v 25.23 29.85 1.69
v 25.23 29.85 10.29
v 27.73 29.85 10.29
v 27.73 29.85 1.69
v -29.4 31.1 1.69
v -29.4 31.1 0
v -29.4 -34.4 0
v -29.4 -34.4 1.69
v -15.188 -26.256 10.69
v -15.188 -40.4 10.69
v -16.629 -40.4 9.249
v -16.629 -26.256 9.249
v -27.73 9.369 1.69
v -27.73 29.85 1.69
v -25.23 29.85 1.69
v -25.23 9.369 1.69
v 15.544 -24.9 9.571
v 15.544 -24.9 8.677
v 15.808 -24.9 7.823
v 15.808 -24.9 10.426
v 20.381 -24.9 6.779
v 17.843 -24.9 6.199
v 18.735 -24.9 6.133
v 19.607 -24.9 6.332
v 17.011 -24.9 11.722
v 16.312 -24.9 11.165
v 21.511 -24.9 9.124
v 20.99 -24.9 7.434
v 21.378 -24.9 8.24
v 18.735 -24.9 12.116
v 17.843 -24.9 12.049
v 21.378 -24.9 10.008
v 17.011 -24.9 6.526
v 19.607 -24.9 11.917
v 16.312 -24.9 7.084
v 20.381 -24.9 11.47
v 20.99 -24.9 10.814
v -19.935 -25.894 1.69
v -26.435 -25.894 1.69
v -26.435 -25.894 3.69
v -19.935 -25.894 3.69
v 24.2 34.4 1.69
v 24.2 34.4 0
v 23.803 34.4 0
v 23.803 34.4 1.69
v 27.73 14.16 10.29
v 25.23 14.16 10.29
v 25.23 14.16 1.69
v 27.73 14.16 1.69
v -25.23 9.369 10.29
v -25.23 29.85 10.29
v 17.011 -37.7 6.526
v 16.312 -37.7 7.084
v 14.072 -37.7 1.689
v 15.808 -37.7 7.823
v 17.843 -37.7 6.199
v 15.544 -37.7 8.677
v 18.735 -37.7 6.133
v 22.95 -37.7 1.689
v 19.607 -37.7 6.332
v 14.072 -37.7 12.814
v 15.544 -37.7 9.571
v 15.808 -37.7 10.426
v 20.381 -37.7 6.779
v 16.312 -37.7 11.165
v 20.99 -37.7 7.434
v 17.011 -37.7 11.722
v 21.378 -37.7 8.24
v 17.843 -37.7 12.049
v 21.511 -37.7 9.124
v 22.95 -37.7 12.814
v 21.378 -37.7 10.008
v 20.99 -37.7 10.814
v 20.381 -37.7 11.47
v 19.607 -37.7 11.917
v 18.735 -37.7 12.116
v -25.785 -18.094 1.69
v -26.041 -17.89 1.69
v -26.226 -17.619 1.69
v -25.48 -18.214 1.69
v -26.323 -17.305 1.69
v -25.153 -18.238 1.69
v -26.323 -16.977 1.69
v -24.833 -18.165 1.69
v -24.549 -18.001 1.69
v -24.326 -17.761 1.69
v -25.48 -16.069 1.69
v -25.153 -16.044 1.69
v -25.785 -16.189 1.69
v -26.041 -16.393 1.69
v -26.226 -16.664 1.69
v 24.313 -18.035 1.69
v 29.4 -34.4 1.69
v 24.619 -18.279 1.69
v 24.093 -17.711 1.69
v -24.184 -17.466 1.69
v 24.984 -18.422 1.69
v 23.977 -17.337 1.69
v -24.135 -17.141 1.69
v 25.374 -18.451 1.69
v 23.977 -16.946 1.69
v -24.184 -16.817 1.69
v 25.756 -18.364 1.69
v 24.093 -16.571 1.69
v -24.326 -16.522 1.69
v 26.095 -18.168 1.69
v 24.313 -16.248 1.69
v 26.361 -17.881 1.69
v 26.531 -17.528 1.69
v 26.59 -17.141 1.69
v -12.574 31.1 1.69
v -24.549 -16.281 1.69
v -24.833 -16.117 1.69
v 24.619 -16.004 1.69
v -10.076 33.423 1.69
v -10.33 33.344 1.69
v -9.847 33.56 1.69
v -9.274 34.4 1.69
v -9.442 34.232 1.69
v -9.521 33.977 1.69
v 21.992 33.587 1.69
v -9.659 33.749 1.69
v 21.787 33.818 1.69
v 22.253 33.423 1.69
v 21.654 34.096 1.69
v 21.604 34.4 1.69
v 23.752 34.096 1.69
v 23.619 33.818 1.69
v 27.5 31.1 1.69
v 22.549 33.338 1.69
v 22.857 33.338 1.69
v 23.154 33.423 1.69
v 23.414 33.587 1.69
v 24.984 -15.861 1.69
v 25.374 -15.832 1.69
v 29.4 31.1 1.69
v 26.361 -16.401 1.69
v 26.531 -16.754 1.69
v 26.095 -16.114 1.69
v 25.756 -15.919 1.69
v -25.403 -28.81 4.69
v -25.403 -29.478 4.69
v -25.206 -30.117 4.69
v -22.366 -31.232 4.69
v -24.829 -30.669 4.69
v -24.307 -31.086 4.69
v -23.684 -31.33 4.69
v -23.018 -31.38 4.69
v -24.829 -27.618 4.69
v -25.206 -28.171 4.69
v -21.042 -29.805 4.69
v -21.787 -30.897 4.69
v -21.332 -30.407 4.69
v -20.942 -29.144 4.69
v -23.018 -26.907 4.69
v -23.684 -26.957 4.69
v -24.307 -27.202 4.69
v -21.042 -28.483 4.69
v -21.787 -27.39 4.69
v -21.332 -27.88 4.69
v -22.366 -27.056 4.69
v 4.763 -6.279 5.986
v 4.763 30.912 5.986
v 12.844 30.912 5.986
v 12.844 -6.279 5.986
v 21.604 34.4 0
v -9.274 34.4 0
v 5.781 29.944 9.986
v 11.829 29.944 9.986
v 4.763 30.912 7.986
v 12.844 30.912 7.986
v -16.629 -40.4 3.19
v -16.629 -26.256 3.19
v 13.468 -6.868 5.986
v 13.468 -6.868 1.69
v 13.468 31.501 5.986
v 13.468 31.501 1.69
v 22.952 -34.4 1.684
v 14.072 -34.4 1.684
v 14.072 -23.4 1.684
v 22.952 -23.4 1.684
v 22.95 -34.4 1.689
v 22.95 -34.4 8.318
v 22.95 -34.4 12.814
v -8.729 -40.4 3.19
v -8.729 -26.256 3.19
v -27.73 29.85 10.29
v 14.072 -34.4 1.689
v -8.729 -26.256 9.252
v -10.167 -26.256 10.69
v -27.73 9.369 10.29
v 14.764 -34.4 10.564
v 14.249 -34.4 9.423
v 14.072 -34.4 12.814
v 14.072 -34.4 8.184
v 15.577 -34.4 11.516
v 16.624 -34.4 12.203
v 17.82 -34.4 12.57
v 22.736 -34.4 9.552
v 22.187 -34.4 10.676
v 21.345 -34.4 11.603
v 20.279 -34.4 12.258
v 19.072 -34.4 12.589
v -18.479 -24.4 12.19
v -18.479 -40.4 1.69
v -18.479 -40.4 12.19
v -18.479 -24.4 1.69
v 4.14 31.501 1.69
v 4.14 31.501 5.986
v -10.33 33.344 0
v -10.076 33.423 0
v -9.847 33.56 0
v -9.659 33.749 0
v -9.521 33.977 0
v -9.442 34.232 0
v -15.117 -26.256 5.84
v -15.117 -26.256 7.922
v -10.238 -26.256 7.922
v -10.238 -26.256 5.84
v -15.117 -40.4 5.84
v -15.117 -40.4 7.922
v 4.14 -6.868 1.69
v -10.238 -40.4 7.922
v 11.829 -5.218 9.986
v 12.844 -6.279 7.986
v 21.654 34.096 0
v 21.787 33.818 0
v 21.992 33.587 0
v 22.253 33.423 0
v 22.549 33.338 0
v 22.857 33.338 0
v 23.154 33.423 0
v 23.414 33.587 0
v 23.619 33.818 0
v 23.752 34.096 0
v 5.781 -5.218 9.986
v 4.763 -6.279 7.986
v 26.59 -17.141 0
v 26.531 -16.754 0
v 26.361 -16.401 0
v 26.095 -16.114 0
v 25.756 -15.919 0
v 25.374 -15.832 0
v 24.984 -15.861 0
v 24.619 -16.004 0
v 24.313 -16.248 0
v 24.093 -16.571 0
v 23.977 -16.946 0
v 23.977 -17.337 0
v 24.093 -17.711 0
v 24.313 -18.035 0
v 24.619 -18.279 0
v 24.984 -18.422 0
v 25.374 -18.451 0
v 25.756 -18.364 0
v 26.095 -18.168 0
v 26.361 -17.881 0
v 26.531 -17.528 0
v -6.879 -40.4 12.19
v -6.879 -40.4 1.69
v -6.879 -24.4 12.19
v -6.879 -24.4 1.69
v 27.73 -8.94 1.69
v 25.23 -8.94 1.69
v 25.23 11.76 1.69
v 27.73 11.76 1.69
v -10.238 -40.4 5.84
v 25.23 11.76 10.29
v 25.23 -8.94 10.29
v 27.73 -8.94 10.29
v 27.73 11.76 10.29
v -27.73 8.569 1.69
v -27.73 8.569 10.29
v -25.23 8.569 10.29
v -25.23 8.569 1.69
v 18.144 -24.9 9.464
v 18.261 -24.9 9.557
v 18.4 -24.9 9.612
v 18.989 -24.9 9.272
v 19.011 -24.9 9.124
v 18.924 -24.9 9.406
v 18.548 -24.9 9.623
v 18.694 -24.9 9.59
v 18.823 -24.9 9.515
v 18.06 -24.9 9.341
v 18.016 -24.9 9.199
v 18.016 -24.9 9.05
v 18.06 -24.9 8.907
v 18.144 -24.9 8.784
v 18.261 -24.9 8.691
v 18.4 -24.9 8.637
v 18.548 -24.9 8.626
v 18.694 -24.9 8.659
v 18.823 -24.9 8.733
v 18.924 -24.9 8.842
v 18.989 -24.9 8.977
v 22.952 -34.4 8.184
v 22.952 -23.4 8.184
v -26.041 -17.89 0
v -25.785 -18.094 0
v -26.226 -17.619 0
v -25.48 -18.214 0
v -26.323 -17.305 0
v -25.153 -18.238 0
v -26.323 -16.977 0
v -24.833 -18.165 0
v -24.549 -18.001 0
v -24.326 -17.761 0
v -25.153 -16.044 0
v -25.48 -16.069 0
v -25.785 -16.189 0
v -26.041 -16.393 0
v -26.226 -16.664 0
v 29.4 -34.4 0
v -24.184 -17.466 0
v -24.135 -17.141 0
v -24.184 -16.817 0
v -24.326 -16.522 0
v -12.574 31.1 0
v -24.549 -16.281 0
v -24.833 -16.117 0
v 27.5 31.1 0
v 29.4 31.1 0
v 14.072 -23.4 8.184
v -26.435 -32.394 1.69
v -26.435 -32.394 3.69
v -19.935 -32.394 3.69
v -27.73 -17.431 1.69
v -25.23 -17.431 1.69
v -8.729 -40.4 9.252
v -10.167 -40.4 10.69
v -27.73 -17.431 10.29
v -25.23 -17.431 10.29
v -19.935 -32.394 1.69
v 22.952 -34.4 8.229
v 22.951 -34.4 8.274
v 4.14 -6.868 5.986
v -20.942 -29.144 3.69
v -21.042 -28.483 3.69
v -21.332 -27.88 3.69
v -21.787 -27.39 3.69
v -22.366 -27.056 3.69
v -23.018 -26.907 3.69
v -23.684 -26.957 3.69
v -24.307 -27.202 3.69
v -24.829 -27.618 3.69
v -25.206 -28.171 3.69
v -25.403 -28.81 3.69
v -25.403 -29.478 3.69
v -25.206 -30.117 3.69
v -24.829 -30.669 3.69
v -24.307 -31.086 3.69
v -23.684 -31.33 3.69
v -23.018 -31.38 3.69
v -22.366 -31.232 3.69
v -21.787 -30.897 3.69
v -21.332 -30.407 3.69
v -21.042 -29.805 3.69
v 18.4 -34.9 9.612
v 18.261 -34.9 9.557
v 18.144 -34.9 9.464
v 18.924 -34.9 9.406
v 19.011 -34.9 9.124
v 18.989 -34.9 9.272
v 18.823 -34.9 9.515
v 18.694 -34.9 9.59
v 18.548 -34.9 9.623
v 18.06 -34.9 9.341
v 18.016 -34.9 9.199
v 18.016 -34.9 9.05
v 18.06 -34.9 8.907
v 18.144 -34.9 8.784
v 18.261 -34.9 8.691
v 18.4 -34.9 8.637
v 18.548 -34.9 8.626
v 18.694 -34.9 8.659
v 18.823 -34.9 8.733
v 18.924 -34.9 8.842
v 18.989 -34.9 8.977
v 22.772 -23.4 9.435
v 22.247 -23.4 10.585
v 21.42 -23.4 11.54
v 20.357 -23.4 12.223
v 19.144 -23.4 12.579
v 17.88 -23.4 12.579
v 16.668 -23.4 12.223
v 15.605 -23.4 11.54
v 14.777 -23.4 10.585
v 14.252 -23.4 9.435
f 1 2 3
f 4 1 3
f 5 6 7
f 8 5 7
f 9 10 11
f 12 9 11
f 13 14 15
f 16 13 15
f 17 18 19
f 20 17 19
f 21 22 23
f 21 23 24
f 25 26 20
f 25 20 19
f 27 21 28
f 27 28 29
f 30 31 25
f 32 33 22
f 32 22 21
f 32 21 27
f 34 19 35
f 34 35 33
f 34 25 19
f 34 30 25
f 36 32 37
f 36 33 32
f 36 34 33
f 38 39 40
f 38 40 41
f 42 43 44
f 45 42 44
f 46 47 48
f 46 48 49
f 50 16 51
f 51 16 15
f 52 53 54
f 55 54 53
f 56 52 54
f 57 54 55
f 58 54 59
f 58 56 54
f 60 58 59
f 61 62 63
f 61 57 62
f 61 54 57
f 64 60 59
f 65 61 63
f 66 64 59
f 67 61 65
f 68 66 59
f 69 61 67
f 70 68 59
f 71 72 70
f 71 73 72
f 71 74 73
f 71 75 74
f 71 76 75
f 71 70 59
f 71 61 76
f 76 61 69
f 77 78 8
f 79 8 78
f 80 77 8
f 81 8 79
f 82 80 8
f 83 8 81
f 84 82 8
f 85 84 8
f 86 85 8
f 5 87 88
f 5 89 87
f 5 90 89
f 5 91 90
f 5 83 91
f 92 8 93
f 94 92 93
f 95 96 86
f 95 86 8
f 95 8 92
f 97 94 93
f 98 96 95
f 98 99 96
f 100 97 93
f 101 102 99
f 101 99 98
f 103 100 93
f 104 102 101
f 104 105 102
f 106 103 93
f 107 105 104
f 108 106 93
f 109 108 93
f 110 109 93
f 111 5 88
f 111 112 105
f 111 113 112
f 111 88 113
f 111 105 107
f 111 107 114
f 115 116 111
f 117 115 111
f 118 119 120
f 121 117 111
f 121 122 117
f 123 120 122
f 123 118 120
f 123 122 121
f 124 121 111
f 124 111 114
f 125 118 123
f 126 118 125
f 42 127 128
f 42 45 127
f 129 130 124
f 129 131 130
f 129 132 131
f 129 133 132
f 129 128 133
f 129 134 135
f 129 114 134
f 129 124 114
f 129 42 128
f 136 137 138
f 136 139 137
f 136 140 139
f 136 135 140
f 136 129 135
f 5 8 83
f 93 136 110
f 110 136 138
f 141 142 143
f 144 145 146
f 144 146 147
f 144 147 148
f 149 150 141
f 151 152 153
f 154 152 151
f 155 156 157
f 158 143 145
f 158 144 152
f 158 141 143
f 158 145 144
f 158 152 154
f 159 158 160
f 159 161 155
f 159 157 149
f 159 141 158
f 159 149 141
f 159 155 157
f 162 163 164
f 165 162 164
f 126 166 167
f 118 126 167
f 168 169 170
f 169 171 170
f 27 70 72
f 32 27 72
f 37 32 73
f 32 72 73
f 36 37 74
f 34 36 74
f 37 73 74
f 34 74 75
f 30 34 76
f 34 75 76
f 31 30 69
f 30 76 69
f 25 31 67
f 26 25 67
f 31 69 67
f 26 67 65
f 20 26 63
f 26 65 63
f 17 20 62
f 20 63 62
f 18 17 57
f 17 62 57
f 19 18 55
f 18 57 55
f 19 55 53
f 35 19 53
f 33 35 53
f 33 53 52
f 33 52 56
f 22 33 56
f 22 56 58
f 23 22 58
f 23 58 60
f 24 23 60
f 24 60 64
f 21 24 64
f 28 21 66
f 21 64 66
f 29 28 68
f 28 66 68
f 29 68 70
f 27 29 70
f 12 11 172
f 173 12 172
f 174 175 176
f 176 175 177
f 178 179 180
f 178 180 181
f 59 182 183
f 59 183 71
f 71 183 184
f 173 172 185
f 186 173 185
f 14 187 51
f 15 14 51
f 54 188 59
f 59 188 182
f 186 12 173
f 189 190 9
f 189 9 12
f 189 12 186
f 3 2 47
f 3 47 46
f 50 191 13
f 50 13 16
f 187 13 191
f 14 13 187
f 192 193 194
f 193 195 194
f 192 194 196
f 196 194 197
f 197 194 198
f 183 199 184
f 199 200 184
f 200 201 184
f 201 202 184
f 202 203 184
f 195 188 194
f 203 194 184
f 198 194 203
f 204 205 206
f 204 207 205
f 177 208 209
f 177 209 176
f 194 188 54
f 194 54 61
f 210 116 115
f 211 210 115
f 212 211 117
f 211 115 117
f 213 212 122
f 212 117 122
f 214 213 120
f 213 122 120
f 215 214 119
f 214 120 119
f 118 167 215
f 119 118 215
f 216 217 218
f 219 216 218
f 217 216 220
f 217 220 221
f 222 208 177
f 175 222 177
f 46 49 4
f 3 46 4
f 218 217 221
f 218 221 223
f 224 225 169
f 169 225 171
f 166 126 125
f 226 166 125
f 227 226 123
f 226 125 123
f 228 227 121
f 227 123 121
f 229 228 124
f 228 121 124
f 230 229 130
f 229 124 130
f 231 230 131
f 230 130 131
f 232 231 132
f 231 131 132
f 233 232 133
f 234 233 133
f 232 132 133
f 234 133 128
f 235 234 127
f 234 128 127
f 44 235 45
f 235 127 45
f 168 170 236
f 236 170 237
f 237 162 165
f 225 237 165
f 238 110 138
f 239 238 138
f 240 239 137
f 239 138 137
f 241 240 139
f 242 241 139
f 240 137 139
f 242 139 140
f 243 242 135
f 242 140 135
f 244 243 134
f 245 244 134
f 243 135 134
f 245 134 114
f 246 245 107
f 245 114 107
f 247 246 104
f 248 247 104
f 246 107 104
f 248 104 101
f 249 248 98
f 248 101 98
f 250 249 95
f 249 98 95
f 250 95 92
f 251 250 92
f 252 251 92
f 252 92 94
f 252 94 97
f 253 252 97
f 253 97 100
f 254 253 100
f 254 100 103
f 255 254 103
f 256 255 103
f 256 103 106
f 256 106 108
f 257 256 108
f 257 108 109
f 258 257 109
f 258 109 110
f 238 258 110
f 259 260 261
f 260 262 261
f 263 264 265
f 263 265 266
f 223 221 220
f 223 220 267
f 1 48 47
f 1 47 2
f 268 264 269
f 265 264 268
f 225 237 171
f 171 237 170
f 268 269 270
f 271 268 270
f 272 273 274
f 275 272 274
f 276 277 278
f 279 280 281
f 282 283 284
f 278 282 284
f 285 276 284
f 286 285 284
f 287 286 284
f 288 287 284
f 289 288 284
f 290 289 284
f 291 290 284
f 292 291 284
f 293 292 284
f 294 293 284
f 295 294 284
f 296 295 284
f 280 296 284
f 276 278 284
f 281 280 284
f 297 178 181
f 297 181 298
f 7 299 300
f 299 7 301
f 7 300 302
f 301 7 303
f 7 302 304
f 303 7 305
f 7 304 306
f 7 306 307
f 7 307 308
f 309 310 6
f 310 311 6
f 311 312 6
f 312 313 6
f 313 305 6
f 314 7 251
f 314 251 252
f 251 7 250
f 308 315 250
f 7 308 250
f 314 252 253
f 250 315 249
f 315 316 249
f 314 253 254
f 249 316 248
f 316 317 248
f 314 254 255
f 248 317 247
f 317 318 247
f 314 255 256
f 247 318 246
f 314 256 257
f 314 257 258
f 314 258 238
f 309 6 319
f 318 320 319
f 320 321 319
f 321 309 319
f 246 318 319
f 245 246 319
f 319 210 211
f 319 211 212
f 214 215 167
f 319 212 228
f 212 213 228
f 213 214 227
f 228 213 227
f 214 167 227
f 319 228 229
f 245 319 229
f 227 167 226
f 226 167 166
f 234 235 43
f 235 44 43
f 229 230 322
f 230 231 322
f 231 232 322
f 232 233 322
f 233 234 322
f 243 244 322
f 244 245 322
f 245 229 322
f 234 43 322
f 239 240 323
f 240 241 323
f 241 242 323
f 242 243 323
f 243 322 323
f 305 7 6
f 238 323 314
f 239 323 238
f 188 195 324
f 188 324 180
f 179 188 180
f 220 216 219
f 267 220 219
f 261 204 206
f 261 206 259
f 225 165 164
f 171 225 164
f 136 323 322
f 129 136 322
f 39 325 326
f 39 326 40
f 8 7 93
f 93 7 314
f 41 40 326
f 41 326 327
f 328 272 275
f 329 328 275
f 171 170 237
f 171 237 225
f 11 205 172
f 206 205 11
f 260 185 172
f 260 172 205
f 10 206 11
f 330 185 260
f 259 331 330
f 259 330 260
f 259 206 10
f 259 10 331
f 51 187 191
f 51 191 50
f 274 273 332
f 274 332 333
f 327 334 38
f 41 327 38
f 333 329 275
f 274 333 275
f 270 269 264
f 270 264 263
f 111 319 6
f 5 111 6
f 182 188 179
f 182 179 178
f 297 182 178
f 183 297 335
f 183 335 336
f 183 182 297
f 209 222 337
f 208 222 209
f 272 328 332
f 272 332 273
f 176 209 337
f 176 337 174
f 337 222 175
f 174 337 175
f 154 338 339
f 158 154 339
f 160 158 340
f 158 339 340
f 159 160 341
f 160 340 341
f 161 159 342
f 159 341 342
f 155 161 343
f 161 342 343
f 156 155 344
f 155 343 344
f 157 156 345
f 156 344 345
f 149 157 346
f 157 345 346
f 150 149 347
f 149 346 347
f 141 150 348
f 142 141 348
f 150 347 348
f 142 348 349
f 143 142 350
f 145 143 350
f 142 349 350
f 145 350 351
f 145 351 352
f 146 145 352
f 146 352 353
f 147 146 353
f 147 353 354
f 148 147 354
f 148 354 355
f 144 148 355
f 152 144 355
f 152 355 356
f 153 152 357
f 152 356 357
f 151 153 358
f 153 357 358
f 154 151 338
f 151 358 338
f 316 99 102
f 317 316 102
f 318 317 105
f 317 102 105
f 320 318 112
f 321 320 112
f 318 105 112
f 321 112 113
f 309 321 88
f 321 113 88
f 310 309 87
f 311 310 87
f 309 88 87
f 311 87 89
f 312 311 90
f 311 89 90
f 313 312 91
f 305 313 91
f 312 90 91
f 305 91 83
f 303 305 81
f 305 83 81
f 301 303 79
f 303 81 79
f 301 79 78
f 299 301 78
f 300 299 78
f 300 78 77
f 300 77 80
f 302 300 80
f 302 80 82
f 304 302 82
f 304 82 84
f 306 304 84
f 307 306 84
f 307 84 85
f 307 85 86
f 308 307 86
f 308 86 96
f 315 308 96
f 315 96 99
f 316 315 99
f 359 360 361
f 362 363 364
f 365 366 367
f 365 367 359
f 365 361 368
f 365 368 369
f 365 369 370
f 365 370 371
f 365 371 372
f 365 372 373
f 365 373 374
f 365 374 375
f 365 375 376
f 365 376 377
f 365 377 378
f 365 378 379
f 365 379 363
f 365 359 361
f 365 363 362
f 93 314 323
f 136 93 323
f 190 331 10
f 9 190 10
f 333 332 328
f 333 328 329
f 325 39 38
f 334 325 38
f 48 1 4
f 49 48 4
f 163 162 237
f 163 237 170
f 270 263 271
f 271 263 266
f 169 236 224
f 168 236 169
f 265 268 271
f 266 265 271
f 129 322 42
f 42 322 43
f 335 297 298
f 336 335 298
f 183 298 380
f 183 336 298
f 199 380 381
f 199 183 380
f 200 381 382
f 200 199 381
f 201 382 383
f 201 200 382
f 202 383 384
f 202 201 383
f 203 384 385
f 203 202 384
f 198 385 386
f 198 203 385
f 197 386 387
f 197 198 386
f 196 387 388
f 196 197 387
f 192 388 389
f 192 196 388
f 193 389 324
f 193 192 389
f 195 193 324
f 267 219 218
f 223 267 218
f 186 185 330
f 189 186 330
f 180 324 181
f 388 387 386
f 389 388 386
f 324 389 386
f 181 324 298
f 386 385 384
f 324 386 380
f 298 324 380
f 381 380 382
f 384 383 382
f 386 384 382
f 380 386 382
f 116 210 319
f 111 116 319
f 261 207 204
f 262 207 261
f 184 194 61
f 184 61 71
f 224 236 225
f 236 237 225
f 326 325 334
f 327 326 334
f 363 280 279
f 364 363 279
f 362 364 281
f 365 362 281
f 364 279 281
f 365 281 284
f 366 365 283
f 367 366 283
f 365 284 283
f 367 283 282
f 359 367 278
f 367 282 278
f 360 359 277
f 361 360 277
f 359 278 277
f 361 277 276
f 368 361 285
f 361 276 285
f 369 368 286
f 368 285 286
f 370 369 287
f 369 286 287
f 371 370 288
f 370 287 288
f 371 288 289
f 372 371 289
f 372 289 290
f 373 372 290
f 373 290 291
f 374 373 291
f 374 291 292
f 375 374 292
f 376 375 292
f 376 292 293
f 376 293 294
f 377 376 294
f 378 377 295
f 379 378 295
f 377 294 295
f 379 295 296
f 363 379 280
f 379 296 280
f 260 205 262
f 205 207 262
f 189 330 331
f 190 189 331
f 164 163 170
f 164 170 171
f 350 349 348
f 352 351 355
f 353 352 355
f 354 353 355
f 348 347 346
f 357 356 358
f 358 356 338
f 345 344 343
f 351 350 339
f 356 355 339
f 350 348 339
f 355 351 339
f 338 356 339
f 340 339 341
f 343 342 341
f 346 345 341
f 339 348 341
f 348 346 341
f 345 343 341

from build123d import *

# Parameters (mm, degrees)
F1_DEPTH   = 1.69
F2_W       = 2.5
F2_H       = 20.7
F3_DEPTH   = 8.6
F2_H_2     = 15.69
F2_H_3     = 20.481327492
F2_H_4     = 26
F6_DEPTH   = 11
F7_W       = 8.87868274
F7_H       = 11.1249446636
F8_DEPTH   = 3.3
F9_R       = 3
F10_DEPTH  = 12.8
F11_R      = 0.5
F12_DEPTH  = 10
F13_W      = 11.6
F13_H      = 10
F14_DEPTH  = 10.5
F15_W      = 11.6
F15_H      = 10.5
F16_DEPTH  = 6
F18_DEPTH  = 14.14393
F19_W      = 4.8785965383
F19_H      = 2.0820805803
F20_DEPTH  = 14.14393
F21_W      = 6.5
F21_H      = 6.5
F22_DEPTH  = 2
F23_R      = 2.2427667378
F24_DEPTH  = 1
F25_W      = 9.3276520822
F25_H      = 38.3693373368
F26_DEPTH  = 4.29568
F27_W      = 8.0811752376
F27_H      = 37.1907090231
F28_DEPTH  = 2
F30_W      = 6.0478351079
F30_H      = 35.1617564447
F28_FACE_W = 8.0811752376
F28_FACE_H = 37.1907090231
F33_DEPTH  = 1.691
F34_R      = 1.1
F34_R_2    = 1.3134018391
F35_DEPTH  = 1.691


# Not quite as in the source:
# - a feature of the source that left no trace in its solid (it failed there, or was rolled back) is left out


with BuildPart() as f1:
    # F0 (on Top) → F1 (new body)
    with BuildSketch(Plane.XY):
        Polygon((24.2, 34.4), (-9.2744298918, 34.4), (-12.5744298918, 31.1), (-29.4, 31.1), (-29.4, -34.4), (29.4, -34.4), (29.4, 31.1), (27.5, 31.1), align=None)
    extrude(amount=F1_DEPTH)

    # F32 (on face) → F33 (cut, through all)
    with BuildSketch(Plane.XY.offset(1.69)):
        with BuildLine():
            Line((-9.4422222306, 34.2322076612), (-10.3304163494, 33.3440135424))
            ThreePointArc((-10.3304163494, 33.3440135424), (-9.7470766516, 33.6488679634), (-9.4422222306, 34.2322076612))
        make_face()
        with BuildLine():
            ThreePointArc((-9.4422222306, 34.2322076612), (-9.4292347048, 34.3290613178), (-9.4248941109, 34.4266854227))
            ThreePointArc((-9.4248941109, 34.4266854227), (-11.3686729734, 35.132402952), (-10.3304163494, 33.3440135424))
            Line((-10.3304163494, 33.3440135424), (-9.4422222306, 34.2322076612))
        make_face()
        with BuildLine():
            Line((23.8030258555, 34.4), (21.6036733251, 34.4))
            ThreePointArc((21.6036733251, 34.4), (22.7033495903, 33.3266854227), (23.8030258555, 34.4))
        make_face()
        with BuildLine():
            ThreePointArc((23.8033495903, 34.4266854227), (22.6900058972, 35.526604486), (21.6036733251, 34.4))
            Line((21.6036733251, 34.4), (23.8030258555, 34.4))
            ThreePointArc((23.8030258555, 34.4), (23.8032686536, 34.4133417295), (23.8033495903, 34.4266854227))
        make_face()
    extrude(amount=-F33_DEPTH, mode=Mode.SUBTRACT)

    # F34 (on face) → F35 (cut, through all)
    with BuildSketch(Plane.XY.offset(1.69)):
        with Locations((-25.2349545183, -17.141347751)):
            Circle(F34_R)
        with Locations((25.2761915326, -17.141347751)):
            Circle(F34_R_2)
    extrude(amount=-F35_DEPTH, mode=Mode.SUBTRACT)


with BuildPart() as f3:
    # F2 (on face) → F3 (new body)
    with BuildSketch(Plane.XY.offset(1.69)):
        with Locations((26.48, 1.41)):
            Rectangle(F2_W, F2_H)
    extrude(amount=F3_DEPTH)


with BuildPart() as f3b:
    # F2 (on face) → F3, piece 2 (new body)
    with BuildSketch(Plane.XY.offset(1.69)):
        with Locations((26.48, 22.005)):
            Rectangle(F2_W, F2_H_2)
    extrude(amount=F3_DEPTH)


with BuildPart() as f3c:
    # F2 (on face) → F3, piece 3 (new body)
    with BuildSketch(Plane.XY.offset(1.69)):
        with Locations((-26.48, 19.609336254)):
            Rectangle(F2_W, F2_H_3)
    extrude(amount=F3_DEPTH)


with BuildPart() as f3d:
    # F2 (on face) → F3, piece 4 (new body)
    with BuildSketch(Plane.XY.offset(1.69)):
        with Locations((-26.48, -4.431327492)):
            Rectangle(F2_W, F2_H_4)
    extrude(amount=F3_DEPTH)


with BuildPart() as f6:
    # F5 (on offset) → F6 (new body)
    with BuildSketch(Plane.XZ.offset(34.4)):
        with BuildLine():
            Line((14.0722493033, 1.6842637178), (22.9522493033, 1.6842637178))
            Line((22.9522493033, 1.6842637178), (22.9522493033, 8.1842637178))
            ThreePointArc((22.9522493033, 8.1842637178), (18.5122493033, 12.6242637178), (14.0722493033, 8.1842637178))
            Line((14.0722493033, 8.1842637178), (14.0722493033, 1.6842637178))
        make_face()
    extrude(amount=-F6_DEPTH)

    # F7 (on offset) → F8 (join)
    with BuildSketch(Plane.XZ.offset(34.4)):
        with Locations((18.5108794831, 7.2514217463)):
            Rectangle(F7_W, F7_H)
    extrude(amount=F8_DEPTH)

    # F9 (on face) → F10 (cut)
    with BuildSketch(Plane.XZ.offset(37.7)):
        with Locations((18.5108794831, 9.124157019)):
            Circle(F9_R)
    extrude(amount=-F10_DEPTH, mode=Mode.SUBTRACT)


with BuildPart() as f12:
    # F11 (on face) → F12 (new body)
    with BuildSketch(Plane.XZ.offset(24.9)):
        with Locations((18.5108794831, 9.124157019)):
            Circle(F11_R)
    extrude(amount=F12_DEPTH)


with BuildPart() as f14:
    # F13 (on face) → F14 (new body)
    with BuildSketch(Plane.XY.offset(1.69)):
        with Locations((-12.6785661542, -29.4)):
            Rectangle(F13_W, F13_H)
    extrude(amount=F14_DEPTH)

    # F15 (on face) → F16 (join)
    with BuildSketch(Plane.XZ.offset(34.4)):
        with Locations((-12.6785661542, 6.94)):
            Rectangle(F15_W, F15_H)
    extrude(amount=F16_DEPTH)

    # F17 (on face) → F18 (cut)
    with BuildSketch(Plane.XZ.offset(40.4)):
        Polygon((-16.6285661542, 9.2491237447), (-16.6285661542, 3.19), (-8.7285661542, 3.19), (-8.7285661542, 9.2515923473), (-10.1669738069, 10.69), (-15.1876898989, 10.69), align=None)
    extrude(amount=-F18_DEPTH, mode=Mode.SUBTRACT)


with BuildPart() as f20:
    # F19 (on face) → F20 (new body, through all)
    with BuildSketch(Plane.XZ.offset(26.25607)):
        with Locations((-12.6773318529, 6.8805450574)):
            Rectangle(F19_W, F19_H)
    extrude(amount=F20_DEPTH)


with BuildPart() as f22:
    # F21 (on face) → F22 (new body)
    with BuildSketch(Plane.XY.offset(1.69)):
        with Locations((-23.1851451099, -29.143884778)):
            Rectangle(F21_W, F21_H)
    extrude(amount=F22_DEPTH)


with BuildPart() as f24:
    # F23 (on face) → F24 (new body)
    with BuildSketch(Plane.XY.offset(3.69)):
        with Locations((-23.1851451099, -29.143884778)):
            Circle(F23_R)
    extrude(amount=F24_DEPTH)


with BuildPart() as f26:
    # F25 (on face) → F26 (new body)
    with BuildSketch(Plane.XY.offset(1.69)):
        with Locations((8.8037233053, 12.316826851)):
            Rectangle(F25_W, F25_H)
    extrude(amount=F26_DEPTH)


with BuildPart() as f28:
    # F27 (on face) → F28 (new body)
    with BuildSketch(Plane.XY.offset(5.98568)):
        with Locations((8.8037233053, 12.316826851)):
            Rectangle(F27_W, F27_H)
    extrude(amount=F28_DEPTH)


with BuildPart() as f31:
    # F30 (on offset) → F31 section 0
    with BuildSketch(Plane.XY.offset(9.98568)):
        with Locations((8.8047666941, 12.3632361647)):
            Rectangle(F30_W, F30_H)
    # F28_face (on face) → F31 section 1
    with BuildSketch(Plane(origin=(8.8037233053, 12.316826851, 7.98568), x_dir=(1, 0, 0), z_dir=(0, 0, 1))):
        Rectangle(F28_FACE_W, F28_FACE_H)
    loft()


solid = Compound([f1.part, f3.part, f3b.part, f3c.part, f3d.part, f6.part, f12.part, f14.part, f20.part, f22.part, f24.part, f26.part, f28.part, f31.part])
